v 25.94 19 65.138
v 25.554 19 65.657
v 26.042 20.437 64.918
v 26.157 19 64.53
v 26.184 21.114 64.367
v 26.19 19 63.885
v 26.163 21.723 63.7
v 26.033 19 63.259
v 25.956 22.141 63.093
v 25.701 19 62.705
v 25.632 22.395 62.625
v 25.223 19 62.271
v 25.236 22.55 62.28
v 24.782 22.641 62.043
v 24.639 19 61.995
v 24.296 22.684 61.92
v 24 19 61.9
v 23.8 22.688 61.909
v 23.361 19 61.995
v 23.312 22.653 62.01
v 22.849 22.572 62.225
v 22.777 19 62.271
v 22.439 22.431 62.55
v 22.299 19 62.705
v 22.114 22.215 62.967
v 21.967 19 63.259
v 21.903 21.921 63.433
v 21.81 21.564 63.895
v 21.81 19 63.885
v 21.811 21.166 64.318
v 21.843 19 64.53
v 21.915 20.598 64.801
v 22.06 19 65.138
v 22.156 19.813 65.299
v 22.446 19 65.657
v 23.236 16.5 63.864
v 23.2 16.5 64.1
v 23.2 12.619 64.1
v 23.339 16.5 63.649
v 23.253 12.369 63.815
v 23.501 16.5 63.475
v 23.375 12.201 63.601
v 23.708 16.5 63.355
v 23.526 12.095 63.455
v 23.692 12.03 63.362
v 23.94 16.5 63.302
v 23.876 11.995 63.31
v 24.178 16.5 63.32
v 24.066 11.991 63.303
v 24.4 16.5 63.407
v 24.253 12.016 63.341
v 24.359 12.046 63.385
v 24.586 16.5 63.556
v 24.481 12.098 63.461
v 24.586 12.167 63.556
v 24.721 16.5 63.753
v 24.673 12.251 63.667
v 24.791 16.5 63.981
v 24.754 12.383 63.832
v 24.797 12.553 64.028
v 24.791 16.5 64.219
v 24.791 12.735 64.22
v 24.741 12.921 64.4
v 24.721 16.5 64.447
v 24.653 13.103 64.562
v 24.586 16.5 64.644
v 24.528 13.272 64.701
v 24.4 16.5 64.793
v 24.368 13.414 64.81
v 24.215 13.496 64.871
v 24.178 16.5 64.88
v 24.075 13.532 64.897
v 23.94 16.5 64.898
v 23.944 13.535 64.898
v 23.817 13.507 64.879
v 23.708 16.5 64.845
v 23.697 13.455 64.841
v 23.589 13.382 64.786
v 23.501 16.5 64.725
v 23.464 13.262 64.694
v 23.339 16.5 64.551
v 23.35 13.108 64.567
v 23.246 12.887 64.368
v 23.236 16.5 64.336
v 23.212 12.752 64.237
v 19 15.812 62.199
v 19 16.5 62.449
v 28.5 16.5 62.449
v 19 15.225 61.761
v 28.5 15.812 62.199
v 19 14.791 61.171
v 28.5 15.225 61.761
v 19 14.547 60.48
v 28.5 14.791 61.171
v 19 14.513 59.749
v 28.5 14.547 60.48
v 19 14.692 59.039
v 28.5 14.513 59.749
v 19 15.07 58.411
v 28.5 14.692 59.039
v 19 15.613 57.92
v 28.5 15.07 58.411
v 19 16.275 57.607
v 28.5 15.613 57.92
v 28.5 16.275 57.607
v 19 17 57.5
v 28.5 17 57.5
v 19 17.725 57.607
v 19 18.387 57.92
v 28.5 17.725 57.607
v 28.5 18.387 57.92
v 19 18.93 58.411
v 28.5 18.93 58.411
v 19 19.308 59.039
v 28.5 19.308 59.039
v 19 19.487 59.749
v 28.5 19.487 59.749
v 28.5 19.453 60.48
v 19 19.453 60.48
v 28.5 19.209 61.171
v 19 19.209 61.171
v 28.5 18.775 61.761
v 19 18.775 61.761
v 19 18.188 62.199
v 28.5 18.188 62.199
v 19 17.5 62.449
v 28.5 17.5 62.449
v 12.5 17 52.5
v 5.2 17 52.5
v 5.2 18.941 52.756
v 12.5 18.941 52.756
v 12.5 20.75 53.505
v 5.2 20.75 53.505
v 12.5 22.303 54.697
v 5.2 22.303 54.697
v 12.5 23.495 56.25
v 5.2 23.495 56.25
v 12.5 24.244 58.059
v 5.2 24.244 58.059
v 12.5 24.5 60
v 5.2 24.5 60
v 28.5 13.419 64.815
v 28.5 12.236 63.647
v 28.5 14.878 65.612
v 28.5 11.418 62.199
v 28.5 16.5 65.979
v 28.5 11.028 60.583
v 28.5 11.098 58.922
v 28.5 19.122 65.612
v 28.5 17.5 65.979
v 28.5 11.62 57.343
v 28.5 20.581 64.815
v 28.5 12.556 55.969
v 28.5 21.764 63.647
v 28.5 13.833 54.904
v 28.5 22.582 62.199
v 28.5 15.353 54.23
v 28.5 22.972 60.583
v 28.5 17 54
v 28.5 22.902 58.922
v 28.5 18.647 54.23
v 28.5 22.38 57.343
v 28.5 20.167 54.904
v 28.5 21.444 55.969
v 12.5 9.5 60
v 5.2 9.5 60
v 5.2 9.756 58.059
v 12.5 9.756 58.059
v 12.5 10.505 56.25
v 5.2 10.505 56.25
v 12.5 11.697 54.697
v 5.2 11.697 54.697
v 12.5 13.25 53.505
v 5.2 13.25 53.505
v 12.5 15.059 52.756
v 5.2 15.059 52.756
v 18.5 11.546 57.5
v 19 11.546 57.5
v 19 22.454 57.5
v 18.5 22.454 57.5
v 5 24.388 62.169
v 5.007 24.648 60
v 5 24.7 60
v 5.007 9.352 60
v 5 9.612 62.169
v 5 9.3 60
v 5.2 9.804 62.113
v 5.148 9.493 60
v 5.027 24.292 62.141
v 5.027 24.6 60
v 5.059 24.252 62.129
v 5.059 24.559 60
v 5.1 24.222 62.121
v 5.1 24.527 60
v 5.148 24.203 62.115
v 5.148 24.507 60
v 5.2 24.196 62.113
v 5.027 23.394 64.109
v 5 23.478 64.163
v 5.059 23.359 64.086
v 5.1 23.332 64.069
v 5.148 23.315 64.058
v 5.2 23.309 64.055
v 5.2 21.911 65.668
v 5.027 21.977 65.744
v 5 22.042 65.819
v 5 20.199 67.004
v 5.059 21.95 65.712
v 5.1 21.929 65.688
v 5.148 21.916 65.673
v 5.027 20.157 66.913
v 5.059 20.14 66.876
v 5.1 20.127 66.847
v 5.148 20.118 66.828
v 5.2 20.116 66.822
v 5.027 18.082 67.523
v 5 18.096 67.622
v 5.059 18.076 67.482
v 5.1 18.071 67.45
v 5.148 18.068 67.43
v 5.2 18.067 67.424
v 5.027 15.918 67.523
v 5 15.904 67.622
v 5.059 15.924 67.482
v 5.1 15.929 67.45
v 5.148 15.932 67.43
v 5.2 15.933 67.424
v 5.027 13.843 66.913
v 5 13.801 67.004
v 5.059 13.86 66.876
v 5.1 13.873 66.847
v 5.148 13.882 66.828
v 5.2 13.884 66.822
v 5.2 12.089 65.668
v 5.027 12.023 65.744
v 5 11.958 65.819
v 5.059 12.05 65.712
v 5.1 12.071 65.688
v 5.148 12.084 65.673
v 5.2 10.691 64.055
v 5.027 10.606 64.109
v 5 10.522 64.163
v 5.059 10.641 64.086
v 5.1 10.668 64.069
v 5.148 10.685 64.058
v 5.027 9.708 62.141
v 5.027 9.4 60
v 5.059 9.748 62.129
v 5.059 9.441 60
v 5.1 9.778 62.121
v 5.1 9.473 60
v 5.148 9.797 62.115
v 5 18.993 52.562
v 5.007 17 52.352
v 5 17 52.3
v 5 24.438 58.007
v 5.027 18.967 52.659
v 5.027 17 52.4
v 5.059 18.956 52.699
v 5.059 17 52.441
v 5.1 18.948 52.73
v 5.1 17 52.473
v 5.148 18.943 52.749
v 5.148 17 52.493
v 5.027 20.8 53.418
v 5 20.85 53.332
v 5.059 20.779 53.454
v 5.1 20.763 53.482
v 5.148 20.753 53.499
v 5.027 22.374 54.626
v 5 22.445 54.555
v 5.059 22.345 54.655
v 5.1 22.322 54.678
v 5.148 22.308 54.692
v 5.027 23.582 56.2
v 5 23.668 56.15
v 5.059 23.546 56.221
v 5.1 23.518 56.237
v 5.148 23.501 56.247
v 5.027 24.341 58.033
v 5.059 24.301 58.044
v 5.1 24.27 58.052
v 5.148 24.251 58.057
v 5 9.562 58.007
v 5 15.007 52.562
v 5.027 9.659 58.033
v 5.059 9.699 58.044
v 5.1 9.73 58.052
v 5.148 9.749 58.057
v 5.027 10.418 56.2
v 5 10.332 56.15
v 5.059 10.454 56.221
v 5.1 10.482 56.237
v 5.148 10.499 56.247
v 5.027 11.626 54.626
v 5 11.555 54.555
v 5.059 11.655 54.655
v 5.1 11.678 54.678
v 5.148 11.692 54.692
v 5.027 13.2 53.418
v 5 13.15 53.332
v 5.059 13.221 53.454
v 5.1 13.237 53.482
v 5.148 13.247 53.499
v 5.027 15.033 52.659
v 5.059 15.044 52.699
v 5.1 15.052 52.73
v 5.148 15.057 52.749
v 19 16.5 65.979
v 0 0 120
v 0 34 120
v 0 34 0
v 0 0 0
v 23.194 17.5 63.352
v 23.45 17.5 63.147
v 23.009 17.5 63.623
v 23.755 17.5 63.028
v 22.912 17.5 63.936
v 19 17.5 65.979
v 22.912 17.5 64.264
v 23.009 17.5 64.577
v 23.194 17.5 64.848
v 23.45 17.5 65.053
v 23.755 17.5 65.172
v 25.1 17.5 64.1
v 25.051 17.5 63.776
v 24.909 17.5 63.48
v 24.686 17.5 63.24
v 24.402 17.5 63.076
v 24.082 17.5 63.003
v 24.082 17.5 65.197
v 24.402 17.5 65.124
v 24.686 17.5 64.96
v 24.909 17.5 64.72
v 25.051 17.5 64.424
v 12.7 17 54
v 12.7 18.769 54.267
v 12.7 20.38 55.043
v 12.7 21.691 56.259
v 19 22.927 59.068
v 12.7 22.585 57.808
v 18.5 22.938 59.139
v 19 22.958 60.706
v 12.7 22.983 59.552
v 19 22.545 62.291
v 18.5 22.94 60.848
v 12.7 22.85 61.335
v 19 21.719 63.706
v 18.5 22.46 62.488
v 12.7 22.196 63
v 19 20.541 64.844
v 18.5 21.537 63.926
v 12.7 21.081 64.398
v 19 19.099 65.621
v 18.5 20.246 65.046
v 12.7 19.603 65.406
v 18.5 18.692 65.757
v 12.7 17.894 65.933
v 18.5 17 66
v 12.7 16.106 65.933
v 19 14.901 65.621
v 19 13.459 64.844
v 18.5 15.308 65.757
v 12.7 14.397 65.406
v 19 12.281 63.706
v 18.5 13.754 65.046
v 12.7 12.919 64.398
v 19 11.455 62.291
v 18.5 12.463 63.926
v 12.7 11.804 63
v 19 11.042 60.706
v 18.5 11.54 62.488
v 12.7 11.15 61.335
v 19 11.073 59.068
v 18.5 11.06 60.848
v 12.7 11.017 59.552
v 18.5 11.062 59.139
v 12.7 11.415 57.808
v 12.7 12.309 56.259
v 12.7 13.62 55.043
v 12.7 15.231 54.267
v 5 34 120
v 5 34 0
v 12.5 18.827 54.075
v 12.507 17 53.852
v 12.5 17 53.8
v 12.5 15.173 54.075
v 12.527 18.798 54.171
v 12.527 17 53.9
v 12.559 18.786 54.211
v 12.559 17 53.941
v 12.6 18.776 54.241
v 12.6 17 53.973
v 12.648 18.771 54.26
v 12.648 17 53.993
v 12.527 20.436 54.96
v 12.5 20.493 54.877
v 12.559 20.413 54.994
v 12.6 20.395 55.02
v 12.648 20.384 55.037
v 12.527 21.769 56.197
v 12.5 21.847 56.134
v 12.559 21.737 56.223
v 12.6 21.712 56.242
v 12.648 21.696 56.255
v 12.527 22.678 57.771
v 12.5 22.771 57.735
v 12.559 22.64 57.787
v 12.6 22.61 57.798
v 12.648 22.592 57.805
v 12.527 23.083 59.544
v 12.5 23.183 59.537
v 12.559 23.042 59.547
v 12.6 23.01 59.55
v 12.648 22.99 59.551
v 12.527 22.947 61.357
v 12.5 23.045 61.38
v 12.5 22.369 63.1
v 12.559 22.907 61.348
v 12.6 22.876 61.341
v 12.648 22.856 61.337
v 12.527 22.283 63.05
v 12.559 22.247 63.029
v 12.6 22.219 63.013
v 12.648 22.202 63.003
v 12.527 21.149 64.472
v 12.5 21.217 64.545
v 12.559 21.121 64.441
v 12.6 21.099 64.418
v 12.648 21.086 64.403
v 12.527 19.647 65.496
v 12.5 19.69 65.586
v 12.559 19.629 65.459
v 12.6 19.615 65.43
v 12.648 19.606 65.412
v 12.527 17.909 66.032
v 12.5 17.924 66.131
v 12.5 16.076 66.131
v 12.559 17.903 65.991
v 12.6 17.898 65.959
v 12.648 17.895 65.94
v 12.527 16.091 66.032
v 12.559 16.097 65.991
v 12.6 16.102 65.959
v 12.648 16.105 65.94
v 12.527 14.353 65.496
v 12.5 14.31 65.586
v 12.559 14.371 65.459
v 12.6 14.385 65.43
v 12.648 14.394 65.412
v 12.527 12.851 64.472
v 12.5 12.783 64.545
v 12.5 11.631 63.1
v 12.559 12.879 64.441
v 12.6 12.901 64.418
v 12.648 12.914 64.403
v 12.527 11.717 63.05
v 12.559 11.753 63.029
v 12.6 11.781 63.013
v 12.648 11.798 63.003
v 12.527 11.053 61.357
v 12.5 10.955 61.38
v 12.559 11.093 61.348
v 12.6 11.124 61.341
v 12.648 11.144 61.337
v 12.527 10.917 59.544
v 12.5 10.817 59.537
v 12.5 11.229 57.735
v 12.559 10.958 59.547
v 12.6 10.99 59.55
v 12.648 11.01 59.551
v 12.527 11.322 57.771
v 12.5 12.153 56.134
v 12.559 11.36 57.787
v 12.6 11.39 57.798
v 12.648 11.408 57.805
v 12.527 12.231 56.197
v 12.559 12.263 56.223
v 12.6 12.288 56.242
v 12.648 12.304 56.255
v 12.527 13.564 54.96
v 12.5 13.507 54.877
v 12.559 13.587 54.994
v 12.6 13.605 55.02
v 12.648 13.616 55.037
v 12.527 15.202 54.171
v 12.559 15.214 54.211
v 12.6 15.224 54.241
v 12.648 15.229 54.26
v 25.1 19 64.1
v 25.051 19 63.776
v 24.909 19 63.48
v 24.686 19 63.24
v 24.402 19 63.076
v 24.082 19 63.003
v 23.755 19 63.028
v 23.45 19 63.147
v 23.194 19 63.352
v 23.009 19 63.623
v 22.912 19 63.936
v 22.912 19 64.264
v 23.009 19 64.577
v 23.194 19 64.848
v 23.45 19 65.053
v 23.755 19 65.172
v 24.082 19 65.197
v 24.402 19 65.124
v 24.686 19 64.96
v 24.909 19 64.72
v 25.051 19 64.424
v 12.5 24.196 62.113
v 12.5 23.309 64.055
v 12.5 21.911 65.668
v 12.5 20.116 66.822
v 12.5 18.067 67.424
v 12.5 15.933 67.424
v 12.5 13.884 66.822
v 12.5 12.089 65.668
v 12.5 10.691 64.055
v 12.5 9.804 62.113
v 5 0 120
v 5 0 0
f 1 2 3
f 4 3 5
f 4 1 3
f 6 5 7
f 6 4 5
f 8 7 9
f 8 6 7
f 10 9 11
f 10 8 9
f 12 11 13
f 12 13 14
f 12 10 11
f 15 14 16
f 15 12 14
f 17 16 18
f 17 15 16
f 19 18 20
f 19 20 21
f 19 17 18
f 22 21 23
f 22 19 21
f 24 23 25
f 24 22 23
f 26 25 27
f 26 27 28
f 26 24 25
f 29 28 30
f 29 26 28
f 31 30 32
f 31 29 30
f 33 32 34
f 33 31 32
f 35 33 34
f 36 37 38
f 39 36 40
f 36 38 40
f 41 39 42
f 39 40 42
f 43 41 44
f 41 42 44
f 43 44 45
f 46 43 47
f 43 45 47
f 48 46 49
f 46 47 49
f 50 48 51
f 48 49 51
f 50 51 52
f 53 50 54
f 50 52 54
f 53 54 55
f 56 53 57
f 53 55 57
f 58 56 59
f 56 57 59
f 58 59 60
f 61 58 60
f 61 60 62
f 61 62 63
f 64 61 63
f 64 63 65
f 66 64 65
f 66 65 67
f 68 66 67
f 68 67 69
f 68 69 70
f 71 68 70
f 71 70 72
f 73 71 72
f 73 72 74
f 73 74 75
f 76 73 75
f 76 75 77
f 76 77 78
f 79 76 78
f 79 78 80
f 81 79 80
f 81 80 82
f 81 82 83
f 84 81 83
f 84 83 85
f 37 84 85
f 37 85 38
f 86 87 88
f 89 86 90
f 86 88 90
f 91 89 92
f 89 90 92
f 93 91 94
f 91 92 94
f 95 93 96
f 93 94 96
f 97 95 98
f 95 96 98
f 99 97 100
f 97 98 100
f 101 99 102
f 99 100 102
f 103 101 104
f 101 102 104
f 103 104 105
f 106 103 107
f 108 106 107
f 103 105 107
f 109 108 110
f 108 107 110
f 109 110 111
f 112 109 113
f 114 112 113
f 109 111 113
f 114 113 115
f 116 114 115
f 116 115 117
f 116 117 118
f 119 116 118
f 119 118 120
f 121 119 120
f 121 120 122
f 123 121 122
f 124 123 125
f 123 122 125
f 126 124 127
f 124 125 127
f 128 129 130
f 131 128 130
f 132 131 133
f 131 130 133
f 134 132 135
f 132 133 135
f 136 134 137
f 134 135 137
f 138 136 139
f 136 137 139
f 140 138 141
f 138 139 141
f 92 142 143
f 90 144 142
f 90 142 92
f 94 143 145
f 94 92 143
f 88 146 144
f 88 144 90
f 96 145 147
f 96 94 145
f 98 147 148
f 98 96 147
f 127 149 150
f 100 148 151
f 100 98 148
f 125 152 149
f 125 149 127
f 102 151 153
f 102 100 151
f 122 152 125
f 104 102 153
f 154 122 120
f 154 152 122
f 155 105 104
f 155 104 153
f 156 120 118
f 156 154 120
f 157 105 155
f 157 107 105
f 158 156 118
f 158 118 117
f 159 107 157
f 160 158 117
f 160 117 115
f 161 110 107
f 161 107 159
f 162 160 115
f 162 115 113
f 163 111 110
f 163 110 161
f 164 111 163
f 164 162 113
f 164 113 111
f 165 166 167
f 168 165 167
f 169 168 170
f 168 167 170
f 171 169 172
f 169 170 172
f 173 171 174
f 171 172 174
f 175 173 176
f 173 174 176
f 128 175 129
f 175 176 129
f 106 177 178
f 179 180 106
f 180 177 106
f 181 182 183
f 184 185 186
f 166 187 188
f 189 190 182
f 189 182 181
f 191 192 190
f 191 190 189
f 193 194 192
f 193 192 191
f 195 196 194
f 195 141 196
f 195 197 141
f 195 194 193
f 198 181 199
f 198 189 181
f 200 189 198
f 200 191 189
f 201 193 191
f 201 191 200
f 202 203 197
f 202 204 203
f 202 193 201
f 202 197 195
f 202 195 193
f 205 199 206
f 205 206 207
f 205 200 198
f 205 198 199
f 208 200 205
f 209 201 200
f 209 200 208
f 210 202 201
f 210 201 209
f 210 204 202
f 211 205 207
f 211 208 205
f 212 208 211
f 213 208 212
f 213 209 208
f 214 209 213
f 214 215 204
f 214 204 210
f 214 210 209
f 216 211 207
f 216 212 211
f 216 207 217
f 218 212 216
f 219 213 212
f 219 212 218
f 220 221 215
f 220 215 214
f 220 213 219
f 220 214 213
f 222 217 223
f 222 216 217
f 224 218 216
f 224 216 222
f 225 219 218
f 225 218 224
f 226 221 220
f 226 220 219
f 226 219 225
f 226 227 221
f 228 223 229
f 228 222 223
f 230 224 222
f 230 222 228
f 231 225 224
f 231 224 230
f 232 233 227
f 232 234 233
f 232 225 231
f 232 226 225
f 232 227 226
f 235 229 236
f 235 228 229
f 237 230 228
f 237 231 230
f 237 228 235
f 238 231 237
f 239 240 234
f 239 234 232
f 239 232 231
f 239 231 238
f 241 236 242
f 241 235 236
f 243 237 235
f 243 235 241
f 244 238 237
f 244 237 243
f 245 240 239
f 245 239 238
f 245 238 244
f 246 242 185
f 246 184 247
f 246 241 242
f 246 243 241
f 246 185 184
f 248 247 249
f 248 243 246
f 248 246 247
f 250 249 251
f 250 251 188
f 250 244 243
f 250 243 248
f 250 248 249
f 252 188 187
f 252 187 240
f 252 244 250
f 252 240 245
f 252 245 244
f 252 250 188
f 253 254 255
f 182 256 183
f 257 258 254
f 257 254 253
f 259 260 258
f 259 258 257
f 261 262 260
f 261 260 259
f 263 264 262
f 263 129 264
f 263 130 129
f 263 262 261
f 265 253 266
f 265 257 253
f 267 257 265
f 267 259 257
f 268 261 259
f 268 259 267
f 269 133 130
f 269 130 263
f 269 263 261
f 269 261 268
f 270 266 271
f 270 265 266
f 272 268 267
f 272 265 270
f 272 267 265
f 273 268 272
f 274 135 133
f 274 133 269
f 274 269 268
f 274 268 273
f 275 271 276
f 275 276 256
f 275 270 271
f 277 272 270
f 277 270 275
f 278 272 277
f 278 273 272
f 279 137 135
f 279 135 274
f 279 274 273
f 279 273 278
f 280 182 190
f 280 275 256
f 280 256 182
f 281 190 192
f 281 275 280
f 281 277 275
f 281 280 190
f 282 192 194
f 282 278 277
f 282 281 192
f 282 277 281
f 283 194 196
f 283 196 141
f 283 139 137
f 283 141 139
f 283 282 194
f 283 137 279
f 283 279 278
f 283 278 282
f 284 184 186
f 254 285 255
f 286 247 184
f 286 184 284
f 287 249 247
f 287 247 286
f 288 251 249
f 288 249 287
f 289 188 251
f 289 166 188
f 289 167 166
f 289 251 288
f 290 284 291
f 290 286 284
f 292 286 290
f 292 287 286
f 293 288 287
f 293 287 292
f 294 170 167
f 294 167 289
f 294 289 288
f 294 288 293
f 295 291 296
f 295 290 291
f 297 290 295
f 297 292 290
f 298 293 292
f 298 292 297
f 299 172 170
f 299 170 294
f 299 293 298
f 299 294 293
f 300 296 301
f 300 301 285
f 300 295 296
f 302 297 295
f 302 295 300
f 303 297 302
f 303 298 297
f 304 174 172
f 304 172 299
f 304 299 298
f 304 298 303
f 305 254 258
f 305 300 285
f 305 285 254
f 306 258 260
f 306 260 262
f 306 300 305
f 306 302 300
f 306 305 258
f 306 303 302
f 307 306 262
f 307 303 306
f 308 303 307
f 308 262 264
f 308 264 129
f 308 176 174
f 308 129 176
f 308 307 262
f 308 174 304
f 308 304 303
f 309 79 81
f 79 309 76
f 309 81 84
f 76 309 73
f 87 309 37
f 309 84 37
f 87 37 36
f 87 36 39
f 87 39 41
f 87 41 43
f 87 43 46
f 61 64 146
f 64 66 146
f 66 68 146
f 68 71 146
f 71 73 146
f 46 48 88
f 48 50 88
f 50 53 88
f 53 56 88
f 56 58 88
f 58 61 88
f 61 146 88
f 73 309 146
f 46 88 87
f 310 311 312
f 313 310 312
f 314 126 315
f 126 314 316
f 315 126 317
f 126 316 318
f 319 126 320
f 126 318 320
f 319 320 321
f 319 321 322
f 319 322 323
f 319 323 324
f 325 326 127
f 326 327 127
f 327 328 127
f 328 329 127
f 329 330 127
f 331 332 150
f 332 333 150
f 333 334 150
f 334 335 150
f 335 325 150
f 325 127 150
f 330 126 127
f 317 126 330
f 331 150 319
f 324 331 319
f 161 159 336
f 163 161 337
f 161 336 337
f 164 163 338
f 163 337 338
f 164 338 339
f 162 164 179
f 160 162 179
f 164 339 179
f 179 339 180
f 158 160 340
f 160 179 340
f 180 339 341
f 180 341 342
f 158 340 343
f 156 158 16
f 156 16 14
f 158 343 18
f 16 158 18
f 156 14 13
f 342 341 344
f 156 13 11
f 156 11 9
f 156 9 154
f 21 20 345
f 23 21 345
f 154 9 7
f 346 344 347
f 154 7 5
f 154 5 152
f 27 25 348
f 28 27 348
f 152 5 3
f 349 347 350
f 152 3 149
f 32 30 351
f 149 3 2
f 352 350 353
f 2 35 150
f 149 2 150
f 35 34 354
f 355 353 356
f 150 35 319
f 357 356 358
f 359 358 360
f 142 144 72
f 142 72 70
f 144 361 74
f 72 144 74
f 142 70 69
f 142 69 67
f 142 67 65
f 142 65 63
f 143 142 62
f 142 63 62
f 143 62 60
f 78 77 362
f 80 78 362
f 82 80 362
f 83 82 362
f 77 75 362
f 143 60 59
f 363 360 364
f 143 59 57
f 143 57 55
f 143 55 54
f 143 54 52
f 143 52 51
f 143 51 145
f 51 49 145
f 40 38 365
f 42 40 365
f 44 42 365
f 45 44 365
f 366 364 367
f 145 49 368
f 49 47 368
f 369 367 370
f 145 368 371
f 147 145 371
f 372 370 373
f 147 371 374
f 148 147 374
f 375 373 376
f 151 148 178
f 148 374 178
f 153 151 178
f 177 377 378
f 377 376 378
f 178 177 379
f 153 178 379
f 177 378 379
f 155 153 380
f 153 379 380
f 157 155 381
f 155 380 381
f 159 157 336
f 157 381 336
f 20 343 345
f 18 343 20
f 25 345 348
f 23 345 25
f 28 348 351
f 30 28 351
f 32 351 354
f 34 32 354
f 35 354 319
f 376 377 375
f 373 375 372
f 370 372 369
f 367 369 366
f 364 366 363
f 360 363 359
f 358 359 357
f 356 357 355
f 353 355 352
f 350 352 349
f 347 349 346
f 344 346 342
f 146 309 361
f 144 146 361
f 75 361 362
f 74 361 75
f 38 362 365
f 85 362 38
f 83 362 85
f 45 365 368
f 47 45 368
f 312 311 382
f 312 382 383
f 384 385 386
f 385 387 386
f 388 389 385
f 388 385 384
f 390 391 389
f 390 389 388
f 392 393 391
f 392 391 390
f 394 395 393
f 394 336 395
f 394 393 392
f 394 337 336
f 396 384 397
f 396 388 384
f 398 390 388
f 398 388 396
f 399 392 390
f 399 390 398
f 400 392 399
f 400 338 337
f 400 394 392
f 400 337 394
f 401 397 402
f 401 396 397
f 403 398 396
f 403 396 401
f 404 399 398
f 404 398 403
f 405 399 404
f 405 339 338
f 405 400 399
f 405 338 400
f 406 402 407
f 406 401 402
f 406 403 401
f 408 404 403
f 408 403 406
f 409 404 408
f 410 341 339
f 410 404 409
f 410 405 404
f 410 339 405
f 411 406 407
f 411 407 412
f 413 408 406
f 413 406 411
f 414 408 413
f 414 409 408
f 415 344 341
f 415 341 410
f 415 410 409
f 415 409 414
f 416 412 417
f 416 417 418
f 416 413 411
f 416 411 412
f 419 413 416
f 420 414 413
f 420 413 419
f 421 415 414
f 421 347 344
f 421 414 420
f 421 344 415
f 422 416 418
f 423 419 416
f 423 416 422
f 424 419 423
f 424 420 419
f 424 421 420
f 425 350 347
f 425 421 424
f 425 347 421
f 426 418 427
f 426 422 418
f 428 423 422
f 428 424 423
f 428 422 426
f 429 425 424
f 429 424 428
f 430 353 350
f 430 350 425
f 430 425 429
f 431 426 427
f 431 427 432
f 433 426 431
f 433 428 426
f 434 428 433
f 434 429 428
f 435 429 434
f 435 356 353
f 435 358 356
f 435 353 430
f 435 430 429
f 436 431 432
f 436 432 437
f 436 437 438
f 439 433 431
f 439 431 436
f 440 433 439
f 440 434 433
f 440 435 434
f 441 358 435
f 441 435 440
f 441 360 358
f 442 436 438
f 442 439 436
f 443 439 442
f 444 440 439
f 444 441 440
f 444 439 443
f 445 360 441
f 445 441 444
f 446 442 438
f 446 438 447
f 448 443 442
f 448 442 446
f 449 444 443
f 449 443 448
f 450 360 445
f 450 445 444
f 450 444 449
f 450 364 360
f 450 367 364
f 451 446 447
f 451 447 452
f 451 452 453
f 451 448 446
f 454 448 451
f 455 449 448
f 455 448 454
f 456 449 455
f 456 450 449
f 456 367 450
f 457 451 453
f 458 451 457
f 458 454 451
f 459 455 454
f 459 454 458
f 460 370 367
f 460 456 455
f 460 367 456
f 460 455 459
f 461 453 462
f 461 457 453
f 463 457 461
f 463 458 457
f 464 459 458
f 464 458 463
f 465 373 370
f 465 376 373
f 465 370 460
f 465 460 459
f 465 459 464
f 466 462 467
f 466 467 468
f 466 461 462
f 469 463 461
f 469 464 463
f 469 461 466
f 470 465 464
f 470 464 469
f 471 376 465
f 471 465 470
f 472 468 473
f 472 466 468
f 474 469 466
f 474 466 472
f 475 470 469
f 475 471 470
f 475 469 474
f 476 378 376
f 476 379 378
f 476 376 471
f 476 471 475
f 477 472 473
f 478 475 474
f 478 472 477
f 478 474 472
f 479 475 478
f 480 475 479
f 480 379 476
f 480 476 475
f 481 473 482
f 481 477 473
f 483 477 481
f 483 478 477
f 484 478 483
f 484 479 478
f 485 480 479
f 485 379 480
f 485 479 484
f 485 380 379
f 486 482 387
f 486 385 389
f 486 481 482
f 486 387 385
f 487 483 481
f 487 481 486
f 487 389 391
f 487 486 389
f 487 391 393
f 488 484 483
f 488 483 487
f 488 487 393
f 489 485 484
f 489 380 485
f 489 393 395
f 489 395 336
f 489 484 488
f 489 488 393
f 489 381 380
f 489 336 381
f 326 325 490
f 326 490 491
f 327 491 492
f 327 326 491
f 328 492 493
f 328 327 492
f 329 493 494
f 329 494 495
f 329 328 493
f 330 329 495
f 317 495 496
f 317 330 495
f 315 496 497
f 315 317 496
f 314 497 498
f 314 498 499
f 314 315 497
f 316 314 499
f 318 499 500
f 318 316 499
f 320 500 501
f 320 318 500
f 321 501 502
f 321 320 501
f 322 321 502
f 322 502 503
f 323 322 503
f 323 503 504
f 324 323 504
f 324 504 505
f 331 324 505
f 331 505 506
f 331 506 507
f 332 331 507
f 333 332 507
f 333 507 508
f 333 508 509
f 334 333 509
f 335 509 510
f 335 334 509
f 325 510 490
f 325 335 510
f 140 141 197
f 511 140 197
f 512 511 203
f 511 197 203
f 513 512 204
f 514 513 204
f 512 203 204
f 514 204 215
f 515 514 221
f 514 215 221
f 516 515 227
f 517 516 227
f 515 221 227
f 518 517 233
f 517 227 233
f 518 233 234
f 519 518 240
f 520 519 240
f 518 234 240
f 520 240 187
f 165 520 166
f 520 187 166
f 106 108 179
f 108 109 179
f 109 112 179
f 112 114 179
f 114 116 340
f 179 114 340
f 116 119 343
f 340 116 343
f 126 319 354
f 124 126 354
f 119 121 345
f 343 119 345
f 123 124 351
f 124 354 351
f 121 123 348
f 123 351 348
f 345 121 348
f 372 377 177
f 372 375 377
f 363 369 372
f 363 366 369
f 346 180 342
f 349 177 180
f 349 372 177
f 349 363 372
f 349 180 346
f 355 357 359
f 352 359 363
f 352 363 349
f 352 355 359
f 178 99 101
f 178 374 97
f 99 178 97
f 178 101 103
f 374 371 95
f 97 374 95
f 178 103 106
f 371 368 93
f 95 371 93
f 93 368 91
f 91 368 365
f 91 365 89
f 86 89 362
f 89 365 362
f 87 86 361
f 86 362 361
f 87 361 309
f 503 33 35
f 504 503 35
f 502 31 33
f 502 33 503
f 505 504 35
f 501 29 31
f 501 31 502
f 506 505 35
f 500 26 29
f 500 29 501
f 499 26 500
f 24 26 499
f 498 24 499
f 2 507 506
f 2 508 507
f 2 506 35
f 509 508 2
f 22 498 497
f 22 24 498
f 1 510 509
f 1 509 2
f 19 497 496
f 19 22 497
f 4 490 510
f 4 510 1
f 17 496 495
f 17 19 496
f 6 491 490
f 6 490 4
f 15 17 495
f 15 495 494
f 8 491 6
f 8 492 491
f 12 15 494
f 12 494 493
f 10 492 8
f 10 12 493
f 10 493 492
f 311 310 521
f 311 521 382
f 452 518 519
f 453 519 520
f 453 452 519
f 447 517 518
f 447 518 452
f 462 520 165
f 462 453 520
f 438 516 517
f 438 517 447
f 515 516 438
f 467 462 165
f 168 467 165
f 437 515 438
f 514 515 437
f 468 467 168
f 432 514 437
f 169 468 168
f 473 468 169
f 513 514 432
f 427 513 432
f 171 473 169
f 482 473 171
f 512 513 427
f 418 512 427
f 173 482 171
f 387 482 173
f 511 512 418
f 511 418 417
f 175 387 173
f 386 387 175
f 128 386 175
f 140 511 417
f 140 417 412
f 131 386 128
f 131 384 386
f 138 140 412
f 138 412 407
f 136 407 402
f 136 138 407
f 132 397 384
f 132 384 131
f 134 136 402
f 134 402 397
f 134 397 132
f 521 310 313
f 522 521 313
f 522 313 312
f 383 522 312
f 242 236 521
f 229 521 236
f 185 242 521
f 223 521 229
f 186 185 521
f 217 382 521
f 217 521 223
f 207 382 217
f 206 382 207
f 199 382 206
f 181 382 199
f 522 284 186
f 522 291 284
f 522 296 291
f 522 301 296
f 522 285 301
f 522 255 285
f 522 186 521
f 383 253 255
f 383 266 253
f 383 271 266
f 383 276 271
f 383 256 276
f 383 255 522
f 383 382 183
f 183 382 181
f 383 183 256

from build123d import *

# Parameters (mm, degrees)
SKETCH1_W                                     = 120
SKETCH1_H                                     = 34
BOSS_EXTRUDE1_DEPTH                           = 5
BOSS_EXTRUDE2_DEPTH                           = 7.5
SKETCH3_R                                     = 6
BOSS_EXTRUDE3_DEPTH                           = 16
CUT_EXTRUDE1_DEPTH                            = 9.5
SKETCH5_W                                     = 0.5
SKETCH5_H                                     = 12
CUT_EXTRUDE2_DEPTH                            = 8.5
CBORE_START                                   = 19
CBORE_FOR_M2_HEX_SOCKET_HEAD_CAP_SCREW1_DEPTH = 3.691221609
CBORE_START_2                                 = 17.5
CBORE_FOR_M2_HEX_SOCKET_HEAD_CAP_SCR_3_O_R    = 1.1
CBORE_FOR_M2_HEX_SOCKET_HEAD_CAP_SCR_3_DEPTH  = 1.5
M2_TAPPED_HOLE1_D                             = 1.6
FILLET1_R                                     = 0.2


# Read off the part's stored shape, not the designer's step: CBORE for M2 Hex Socket Head Cap Screw1
with BuildPart() as part:
    # Sketch1 → Boss-Extrude1 (new body)
    with BuildSketch(Plane(origin=(0, 0, 0), x_dir=(0, 0, -1), z_dir=(1, 0, 0))):
        with Locations((-60, 17)):
            Rectangle(SKETCH1_W, SKETCH1_H)
    extrude(amount=BOSS_EXTRUDE1_DEPTH)

    # Sketch2 → Boss-Extrude2 (add)
    with BuildSketch(Plane(origin=(5, 0, 0), x_dir=(0, 0, -1), z_dir=(1, 0, 0))):
        with BuildLine():
            ThreePointArc((-52.5, 17), (-54.696699141, 22.303300859), (-60, 24.5))
            Line((-60, 24.5), (-60, 9.5))
            ThreePointArc((-60, 9.5), (-54.696699141, 11.696699141), (-52.5, 17))
        make_face()
        with BuildLine():
            Line((-60, 9.5), (-60, 24.5))
            ThreePointArc((-60, 24.5), (-67.5, 17), (-60, 9.5))
        make_face()
    extrude(amount=BOSS_EXTRUDE2_DEPTH)

    # Sketch3 → Boss-Extrude3 (add)
    with BuildSketch(Plane(origin=(12.5, 0, 0), x_dir=(0, 0, -1), z_dir=(1, 0, 0))):
        with Locations((-60, 17)):
            Circle(SKETCH3_R)
    extrude(amount=BOSS_EXTRUDE3_DEPTH)

    # Sketch4 → Cut-Extrude1 (cut)
    with BuildSketch(Plane(origin=(28.5, 0, 0), x_dir=(0, 0, -1), z_dir=(1, 0, 0))):
        with BuildLine():
            Line((-62.449489743, 17.5), (-67.449489743, 17.5))
            Line((-67.449489743, 17.5), (-67.449489743, 16.5))
            Line((-67.449489743, 16.5), (-62.449489743, 16.5))
            ThreePointArc((-62.449489743, 16.5), (-57.5, 17), (-62.449489743, 17.5))
        make_face()
    extrude(amount=-CUT_EXTRUDE1_DEPTH, mode=Mode.SUBTRACT)

    # Sketch5 → Cut-Extrude2 (cut)
    with BuildSketch(Plane.XY.offset(66)):
        with Locations((18.75, 17)):
            Rectangle(SKETCH5_W, SKETCH5_H)
    extrude(amount=-CUT_EXTRUDE2_DEPTH, mode=Mode.SUBTRACT)

    # CBORE for M2 Hex Socket Head Cap Scr 2 → CBORE for M2 Hex Socket Head Cap Screw1 (cut)
    with BuildSketch(Plane(origin=(0, 0, 0), x_dir=(1, 0, 0), z_dir=(0, 1, 0)).offset(CBORE_START)):
        with BuildLine():
            Line((24.209160843, -67), (25.554414631, -65.656854249))
            ThreePointArc((25.554414631, -65.656854249), (24, -61.9), (22.445585369, -65.656854249))
            Line((22.445585369, -65.656854249), (23.790839157, -67))
            Line((23.790839157, -67), (24.209160843, -67))
        make_face()
    extrude(amount=CBORE_FOR_M2_HEX_SOCKET_HEAD_CAP_SCREW1_DEPTH, mode=Mode.SUBTRACT)

    # CBORE for M2 Hex Socket Head Cap Scr 3 o → CBORE for M2 Hex Socket Head Cap Scr 3 (cut)
    with BuildSketch(Plane(origin=(0, 0, 0), x_dir=(1, 0, 0), z_dir=(0, 1, 0)).offset(CBORE_START_2)):
        with Locations((24, -64.1)):
            Circle(CBORE_FOR_M2_HEX_SOCKET_HEAD_CAP_SCR_3_O_R)
    extrude(amount=CBORE_FOR_M2_HEX_SOCKET_HEAD_CAP_SCR_3_DEPTH, mode=Mode.SUBTRACT)

    # M2 Tapped Hole1 (through all)
    with Locations(Plane(origin=(0, 16.5, 0), x_dir=(1, 0, 0), z_dir=(0, 1, 0))):
        with Locations((24, -64.1)):
            Hole(M2_TAPPED_HOLE1_D / 2)

    # Fillet1
    fillet1_edges = [part.edges().sort_by_distance(p)[0] for p in [
        (5, 24.5, 60),
        (12.5, 17, 66),
    ]]
    fillet(fillet1_edges, radius=FILLET1_R)


solid = part.part
